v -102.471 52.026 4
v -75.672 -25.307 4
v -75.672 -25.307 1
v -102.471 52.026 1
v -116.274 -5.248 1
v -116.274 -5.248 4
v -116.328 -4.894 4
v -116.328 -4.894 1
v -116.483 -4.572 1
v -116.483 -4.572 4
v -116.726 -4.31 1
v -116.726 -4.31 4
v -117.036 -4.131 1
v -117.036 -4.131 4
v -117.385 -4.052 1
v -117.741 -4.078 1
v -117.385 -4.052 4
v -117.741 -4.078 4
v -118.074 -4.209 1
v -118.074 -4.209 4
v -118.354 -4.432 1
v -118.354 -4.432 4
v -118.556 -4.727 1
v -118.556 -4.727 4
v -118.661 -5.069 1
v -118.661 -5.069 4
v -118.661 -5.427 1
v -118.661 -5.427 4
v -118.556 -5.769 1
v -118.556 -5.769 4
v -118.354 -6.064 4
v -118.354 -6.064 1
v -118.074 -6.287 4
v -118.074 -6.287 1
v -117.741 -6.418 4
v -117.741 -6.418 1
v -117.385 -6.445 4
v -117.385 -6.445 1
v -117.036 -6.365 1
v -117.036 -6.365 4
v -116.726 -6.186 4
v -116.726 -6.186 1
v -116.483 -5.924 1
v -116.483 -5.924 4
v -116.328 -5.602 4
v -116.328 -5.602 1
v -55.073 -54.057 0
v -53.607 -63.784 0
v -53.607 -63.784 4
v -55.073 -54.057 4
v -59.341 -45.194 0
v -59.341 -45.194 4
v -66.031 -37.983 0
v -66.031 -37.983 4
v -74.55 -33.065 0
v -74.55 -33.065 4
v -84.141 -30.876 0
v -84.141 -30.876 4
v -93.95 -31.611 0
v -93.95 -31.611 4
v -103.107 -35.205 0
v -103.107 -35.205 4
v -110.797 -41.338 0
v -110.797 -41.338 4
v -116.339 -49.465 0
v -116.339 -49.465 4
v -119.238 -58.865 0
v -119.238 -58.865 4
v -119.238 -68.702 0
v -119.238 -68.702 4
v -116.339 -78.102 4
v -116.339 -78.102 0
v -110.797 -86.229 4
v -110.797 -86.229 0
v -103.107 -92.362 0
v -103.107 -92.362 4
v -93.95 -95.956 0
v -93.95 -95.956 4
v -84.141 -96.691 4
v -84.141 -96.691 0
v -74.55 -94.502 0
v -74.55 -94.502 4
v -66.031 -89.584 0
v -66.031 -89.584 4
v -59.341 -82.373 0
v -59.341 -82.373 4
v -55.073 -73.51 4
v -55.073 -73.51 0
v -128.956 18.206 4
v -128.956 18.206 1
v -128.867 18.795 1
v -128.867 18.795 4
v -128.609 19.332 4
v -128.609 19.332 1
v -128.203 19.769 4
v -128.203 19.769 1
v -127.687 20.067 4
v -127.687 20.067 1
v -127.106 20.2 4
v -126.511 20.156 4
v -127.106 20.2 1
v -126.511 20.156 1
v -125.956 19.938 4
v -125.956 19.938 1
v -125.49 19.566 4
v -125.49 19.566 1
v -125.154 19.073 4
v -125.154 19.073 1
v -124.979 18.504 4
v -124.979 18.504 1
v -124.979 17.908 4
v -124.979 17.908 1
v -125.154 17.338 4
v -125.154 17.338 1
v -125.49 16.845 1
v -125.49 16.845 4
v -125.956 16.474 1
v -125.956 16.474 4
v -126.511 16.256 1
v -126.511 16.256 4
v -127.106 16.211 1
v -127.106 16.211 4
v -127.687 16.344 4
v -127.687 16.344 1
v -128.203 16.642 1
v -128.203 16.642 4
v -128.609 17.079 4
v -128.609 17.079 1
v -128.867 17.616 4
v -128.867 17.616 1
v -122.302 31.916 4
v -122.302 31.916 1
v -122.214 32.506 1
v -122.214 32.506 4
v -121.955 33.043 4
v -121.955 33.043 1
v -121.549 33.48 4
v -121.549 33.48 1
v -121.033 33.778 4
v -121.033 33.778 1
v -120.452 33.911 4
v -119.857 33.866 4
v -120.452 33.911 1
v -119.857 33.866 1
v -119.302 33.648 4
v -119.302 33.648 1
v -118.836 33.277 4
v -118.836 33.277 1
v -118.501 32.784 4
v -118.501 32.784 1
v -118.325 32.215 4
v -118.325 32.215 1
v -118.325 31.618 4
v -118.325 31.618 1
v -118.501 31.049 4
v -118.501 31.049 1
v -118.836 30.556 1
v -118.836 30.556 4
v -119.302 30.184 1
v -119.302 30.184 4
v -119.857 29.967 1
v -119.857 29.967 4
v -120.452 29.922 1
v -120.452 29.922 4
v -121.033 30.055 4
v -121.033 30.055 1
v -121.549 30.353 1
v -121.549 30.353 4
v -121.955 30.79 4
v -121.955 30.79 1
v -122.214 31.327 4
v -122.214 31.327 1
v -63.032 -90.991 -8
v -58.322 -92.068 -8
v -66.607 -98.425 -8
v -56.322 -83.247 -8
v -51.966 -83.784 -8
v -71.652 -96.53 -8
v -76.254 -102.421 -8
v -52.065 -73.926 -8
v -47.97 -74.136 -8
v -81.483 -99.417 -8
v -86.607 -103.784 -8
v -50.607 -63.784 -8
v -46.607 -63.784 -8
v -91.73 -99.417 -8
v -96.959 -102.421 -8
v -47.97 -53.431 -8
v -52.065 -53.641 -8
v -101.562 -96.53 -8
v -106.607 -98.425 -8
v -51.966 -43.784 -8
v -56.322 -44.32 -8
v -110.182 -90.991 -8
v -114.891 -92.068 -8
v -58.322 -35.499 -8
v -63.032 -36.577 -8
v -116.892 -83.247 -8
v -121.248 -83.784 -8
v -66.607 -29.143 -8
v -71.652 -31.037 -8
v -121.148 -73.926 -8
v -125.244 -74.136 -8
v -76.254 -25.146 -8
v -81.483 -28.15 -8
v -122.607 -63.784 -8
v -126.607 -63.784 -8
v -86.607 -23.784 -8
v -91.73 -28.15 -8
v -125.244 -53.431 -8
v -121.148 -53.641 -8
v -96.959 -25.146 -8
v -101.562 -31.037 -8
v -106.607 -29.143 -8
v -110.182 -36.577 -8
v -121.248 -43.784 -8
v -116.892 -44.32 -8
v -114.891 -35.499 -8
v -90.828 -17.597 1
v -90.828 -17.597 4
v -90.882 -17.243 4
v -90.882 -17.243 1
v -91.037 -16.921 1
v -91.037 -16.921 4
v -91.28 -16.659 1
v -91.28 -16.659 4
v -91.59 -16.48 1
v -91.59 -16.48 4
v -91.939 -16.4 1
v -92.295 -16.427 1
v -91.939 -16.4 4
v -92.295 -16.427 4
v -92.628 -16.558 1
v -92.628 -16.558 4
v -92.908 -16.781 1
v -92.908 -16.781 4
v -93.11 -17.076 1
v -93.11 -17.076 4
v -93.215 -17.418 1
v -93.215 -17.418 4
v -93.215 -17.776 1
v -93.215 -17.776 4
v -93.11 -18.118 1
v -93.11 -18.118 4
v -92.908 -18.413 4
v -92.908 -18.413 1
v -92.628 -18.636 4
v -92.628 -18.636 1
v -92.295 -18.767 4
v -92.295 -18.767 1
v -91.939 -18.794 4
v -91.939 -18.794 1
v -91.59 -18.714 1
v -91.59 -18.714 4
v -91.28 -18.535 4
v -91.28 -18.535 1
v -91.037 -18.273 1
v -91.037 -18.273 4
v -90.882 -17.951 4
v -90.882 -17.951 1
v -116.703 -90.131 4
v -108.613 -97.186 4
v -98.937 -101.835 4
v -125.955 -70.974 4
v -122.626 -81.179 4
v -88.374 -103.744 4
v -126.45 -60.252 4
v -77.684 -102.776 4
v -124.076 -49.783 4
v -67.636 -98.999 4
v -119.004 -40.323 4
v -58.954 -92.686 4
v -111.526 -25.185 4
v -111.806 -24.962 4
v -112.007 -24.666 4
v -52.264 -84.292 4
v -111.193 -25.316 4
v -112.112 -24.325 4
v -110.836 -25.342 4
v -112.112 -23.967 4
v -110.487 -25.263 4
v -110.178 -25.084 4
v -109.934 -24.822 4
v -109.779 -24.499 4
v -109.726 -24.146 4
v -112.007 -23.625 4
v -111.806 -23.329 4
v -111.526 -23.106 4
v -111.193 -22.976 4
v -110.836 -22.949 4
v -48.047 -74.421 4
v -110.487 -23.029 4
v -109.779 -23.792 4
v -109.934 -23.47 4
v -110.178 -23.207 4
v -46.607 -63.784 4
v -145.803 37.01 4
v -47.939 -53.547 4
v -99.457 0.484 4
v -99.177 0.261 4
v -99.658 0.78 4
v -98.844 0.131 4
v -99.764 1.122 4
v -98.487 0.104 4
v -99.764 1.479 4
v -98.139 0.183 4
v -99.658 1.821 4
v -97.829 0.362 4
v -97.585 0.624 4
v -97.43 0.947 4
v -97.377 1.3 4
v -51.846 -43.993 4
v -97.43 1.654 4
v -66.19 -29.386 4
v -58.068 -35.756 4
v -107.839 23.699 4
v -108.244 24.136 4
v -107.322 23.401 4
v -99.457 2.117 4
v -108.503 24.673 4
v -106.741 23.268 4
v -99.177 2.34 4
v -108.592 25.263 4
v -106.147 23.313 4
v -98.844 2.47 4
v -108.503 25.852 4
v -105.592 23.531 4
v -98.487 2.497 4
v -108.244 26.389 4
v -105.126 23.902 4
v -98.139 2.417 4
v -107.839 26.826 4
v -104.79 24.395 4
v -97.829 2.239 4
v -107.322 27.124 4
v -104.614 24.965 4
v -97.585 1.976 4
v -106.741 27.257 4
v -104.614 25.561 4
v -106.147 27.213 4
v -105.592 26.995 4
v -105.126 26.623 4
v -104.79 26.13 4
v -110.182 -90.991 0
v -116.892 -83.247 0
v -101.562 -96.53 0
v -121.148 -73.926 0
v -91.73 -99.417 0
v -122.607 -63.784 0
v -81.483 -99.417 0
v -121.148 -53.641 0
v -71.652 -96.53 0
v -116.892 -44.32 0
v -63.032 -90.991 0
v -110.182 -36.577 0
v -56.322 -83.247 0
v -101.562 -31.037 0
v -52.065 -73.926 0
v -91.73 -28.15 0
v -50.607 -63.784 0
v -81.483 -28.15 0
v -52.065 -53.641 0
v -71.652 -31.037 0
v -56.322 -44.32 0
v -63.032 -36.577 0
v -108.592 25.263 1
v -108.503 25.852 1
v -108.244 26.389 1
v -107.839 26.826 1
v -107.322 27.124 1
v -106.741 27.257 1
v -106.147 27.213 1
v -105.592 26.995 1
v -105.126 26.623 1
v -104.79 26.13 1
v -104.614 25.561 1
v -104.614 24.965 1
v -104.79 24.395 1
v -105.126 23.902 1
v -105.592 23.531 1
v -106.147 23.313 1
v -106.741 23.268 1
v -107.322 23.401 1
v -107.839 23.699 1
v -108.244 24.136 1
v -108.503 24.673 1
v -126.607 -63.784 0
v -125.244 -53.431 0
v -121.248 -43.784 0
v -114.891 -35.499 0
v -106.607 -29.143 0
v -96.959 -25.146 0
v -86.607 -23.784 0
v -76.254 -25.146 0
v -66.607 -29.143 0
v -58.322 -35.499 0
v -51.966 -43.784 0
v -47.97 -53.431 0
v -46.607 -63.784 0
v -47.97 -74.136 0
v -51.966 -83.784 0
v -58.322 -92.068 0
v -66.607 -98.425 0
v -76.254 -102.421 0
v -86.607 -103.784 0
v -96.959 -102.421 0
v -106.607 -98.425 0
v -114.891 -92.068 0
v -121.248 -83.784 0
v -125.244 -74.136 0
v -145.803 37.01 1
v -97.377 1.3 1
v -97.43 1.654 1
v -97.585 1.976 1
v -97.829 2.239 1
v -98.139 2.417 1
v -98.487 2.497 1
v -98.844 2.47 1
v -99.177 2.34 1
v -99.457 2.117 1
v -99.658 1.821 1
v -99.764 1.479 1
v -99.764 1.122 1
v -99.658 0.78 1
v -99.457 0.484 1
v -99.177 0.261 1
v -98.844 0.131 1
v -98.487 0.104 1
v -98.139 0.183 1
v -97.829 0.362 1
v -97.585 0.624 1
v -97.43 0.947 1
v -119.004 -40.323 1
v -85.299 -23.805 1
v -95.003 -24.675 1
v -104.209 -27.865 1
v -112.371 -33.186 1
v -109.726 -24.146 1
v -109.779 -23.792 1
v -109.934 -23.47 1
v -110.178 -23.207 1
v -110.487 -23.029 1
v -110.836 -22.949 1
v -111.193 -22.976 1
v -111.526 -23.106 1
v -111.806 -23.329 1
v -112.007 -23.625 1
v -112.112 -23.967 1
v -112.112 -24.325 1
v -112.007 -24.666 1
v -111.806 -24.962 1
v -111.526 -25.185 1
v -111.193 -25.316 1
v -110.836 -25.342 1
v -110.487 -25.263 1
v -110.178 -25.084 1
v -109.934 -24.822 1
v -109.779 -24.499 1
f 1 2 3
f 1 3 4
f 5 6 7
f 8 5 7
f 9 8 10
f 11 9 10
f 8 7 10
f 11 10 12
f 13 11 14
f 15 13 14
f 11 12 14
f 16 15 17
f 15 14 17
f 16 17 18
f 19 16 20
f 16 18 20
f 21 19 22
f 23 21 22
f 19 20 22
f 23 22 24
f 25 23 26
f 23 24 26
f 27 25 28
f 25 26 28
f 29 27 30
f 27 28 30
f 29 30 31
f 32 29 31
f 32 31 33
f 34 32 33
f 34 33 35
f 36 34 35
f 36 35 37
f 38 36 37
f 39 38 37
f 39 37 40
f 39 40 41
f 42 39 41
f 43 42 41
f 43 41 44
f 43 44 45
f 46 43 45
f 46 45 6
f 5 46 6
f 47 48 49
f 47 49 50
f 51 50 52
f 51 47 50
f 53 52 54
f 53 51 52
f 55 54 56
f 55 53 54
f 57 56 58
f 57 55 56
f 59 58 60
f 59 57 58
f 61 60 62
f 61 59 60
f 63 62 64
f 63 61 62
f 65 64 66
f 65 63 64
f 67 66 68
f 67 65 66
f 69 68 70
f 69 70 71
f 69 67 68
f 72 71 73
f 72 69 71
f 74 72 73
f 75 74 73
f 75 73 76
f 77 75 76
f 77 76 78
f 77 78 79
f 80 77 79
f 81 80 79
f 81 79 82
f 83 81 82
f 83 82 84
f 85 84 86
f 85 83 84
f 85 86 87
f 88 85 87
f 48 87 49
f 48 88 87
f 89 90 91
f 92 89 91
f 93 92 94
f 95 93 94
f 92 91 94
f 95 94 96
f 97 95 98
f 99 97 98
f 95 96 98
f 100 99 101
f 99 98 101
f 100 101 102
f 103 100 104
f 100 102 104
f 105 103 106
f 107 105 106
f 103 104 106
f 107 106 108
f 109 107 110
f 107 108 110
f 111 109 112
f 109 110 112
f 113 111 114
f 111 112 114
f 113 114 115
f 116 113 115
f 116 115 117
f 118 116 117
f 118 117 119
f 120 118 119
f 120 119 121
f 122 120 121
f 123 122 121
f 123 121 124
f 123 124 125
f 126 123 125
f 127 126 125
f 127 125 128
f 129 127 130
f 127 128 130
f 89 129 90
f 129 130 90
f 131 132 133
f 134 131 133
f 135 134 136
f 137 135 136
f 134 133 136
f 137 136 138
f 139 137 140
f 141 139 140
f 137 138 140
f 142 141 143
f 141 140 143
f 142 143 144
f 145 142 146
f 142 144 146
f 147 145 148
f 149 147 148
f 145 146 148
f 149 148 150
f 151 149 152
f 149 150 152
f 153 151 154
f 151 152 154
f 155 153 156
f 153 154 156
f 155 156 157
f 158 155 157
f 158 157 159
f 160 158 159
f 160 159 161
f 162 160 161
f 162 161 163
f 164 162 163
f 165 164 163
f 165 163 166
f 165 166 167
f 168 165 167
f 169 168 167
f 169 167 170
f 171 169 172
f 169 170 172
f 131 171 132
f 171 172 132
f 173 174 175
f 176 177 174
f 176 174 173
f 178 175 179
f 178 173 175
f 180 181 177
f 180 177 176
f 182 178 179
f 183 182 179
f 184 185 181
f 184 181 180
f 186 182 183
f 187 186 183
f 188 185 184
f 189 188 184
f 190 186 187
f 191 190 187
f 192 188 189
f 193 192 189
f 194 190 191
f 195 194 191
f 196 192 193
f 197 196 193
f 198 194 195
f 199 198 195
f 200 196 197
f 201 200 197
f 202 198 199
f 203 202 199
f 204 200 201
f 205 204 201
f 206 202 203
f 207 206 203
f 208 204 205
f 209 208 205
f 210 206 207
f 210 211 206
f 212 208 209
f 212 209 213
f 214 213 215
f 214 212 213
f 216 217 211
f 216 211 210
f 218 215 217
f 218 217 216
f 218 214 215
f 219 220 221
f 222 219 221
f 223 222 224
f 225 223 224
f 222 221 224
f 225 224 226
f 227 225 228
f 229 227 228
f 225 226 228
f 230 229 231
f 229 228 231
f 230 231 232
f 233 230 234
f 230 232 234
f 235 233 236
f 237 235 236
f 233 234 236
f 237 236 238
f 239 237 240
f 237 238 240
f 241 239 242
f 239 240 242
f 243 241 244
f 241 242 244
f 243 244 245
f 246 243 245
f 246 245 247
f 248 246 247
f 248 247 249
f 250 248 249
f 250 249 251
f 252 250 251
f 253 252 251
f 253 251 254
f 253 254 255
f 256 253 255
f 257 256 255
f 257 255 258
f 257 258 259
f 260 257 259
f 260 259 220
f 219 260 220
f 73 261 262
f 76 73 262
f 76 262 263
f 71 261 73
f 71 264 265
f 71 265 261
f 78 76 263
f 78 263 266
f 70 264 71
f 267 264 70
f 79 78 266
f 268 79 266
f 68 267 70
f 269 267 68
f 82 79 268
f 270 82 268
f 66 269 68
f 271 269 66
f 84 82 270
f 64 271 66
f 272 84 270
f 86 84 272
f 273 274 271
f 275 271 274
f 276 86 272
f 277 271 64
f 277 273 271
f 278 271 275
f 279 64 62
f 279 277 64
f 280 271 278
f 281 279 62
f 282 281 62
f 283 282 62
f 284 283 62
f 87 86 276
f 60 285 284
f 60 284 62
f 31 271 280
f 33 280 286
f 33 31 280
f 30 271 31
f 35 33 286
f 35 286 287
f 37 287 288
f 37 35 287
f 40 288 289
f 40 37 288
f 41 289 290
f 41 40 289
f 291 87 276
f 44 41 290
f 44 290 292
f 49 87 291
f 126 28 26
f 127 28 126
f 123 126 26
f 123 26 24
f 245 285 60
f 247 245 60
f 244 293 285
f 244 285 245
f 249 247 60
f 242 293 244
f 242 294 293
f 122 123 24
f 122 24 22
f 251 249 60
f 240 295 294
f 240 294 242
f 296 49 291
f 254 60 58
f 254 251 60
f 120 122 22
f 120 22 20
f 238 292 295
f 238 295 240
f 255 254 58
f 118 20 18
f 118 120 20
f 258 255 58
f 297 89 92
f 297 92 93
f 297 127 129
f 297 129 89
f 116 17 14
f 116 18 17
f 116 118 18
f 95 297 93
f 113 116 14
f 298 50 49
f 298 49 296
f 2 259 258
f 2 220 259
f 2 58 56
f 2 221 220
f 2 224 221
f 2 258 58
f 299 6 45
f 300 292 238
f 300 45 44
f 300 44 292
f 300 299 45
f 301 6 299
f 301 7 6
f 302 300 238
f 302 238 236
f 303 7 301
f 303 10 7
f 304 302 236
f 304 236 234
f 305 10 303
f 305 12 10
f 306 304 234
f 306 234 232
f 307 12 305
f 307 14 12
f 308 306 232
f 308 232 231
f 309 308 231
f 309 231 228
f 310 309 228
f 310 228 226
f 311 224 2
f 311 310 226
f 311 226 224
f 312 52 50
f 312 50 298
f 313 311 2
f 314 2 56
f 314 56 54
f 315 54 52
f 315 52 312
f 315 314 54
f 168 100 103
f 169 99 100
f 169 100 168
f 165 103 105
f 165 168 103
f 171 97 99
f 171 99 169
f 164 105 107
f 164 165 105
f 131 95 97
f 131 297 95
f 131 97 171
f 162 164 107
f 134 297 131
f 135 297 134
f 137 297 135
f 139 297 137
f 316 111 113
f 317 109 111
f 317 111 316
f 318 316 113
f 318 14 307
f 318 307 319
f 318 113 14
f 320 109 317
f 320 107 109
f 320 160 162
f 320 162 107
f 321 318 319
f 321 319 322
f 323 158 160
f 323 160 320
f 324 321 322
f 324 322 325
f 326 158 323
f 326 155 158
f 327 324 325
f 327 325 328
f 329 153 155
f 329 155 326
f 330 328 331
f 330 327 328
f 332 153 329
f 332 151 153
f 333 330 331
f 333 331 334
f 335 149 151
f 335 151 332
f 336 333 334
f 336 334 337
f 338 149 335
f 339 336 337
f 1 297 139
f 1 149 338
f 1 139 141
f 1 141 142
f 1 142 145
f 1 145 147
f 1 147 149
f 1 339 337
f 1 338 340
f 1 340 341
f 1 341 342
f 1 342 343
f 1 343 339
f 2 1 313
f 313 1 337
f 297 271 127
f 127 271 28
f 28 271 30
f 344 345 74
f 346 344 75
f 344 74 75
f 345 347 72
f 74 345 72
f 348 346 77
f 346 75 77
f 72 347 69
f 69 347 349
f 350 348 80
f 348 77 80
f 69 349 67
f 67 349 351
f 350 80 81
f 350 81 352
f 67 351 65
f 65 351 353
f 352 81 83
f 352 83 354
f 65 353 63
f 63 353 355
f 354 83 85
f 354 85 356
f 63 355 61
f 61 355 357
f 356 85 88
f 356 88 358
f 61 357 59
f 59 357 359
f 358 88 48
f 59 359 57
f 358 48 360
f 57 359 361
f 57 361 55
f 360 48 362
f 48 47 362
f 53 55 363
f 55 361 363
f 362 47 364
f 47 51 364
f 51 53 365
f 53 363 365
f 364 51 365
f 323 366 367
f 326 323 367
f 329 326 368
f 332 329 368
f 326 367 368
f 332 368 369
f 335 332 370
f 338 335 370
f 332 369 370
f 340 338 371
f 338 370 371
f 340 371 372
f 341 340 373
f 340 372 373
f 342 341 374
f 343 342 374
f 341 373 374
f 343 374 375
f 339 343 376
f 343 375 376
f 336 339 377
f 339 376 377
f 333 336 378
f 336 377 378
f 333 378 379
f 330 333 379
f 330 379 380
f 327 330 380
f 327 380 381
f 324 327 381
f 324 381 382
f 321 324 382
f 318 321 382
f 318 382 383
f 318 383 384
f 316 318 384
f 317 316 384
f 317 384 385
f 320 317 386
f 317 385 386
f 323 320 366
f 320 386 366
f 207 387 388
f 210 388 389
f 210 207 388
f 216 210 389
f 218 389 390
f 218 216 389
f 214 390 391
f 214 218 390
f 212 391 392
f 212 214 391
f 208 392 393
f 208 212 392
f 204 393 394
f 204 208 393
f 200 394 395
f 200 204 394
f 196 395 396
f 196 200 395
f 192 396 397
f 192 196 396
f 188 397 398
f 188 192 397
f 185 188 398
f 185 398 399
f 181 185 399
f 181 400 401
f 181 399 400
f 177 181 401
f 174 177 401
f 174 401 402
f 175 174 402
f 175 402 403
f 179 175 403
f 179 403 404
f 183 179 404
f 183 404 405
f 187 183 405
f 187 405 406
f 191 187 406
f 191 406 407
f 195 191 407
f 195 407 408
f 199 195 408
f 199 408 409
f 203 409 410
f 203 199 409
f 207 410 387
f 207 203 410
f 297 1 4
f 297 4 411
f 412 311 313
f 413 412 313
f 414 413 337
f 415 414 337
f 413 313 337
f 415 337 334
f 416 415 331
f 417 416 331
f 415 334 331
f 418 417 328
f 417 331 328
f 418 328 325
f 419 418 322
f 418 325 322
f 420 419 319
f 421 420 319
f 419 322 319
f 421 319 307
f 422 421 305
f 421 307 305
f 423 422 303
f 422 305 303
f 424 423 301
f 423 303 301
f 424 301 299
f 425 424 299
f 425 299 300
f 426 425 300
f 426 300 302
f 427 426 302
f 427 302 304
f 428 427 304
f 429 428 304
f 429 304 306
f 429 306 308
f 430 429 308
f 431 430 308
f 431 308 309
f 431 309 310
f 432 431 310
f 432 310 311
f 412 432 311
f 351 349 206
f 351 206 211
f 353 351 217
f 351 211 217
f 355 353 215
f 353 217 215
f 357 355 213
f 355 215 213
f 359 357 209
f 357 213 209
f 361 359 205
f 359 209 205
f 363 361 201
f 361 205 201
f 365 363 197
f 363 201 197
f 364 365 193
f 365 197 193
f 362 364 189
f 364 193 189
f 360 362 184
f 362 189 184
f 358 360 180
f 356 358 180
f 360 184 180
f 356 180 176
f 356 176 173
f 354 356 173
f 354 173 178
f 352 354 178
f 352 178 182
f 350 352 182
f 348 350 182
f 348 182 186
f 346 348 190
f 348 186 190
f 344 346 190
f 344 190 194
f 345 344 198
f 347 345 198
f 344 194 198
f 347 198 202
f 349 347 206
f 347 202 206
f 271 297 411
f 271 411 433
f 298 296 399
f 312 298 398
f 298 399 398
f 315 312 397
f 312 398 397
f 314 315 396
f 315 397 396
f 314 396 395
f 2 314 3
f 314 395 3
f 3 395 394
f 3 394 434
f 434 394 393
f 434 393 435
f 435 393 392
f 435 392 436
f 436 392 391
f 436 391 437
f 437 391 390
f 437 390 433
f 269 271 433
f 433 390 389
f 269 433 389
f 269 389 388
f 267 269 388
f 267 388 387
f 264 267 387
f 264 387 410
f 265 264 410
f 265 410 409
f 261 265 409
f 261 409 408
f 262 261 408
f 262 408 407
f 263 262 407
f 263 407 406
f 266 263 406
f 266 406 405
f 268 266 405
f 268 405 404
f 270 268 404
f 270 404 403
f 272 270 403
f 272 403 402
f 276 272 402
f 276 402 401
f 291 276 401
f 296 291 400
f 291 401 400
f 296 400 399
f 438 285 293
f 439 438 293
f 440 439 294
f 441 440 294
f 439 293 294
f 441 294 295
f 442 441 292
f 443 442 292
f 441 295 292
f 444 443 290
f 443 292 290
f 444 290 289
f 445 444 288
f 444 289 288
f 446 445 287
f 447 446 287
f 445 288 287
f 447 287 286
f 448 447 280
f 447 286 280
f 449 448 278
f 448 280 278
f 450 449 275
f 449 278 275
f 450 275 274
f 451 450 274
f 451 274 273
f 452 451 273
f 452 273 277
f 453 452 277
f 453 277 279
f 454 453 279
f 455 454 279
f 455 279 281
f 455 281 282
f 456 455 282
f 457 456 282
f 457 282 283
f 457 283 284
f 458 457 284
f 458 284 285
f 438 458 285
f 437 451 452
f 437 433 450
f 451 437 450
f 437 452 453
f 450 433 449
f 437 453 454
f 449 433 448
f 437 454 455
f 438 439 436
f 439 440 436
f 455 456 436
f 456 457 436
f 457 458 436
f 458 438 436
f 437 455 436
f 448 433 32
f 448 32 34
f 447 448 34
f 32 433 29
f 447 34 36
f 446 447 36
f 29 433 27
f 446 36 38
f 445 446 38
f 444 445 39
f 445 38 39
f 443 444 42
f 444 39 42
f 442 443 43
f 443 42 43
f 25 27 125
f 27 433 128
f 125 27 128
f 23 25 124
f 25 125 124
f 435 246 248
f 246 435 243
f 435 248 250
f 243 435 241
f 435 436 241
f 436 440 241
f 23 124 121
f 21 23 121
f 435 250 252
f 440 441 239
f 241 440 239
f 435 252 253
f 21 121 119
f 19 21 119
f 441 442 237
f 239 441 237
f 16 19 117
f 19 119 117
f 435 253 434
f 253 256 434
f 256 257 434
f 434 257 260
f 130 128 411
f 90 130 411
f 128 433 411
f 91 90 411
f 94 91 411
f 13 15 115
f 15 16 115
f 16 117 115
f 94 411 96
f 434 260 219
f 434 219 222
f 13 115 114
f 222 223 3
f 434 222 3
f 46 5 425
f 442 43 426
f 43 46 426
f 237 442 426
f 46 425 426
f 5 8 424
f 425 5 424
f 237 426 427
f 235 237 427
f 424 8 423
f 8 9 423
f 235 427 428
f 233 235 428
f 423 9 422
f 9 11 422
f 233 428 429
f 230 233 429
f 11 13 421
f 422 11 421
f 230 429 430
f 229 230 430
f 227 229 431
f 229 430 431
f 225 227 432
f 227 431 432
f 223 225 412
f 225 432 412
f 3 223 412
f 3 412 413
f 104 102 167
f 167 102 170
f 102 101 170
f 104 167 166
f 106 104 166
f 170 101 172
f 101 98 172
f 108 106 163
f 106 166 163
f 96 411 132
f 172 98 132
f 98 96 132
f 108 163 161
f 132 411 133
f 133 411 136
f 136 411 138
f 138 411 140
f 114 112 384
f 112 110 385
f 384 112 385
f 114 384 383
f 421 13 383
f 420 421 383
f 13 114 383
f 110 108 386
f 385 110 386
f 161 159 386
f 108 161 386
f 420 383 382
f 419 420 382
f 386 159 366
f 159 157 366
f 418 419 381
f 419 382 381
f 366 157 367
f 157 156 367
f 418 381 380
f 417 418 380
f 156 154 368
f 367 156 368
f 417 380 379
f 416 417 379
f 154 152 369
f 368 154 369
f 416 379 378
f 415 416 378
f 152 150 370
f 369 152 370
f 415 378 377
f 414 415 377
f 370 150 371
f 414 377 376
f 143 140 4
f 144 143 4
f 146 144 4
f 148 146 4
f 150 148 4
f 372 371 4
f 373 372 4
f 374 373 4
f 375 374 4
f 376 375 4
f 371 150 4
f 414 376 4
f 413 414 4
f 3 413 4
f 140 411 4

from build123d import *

# Parameters (mm, degrees)
SKETCH_1_R          = 40
SKETCH_1_R_2        = 33
EXTRUDE_1_DEPTH     = 4
EXTRUDE_START       = 8
SKETCH_2_R          = 40
SKETCH_2_R_2        = 36
EXTRUDE_2_DEPTH     = 8
EXTRUDE_3_DEPTH     = 3
SKETCH_6_R          = 2
CUT_EXTRUDE_1_DEPTH = 3
SKETCH_7_R          = 1.2
CUT_EXTRUDE_2_DEPTH = 5


with BuildPart() as part:
    # 草图1 → 凸台-拉伸1 (new body)
    with BuildSketch(Plane.XY):
        with Locations((-86.606649797, -63.783530386)):
            Circle(SKETCH_1_R)
        with Locations((-86.606649797, -63.783530386)):
            Circle(SKETCH_1_R_2, mode=Mode.SUBTRACT)
    extrude(amount=EXTRUDE_1_DEPTH)

    # 草图2 → 凸台-拉伸2 (add)
    with BuildSketch(Plane(origin=(0, 0, 0), x_dir=(-1, 0, 0), z_dir=(0, 0, -1)).offset(EXTRUDE_START)):
        with Locations((86.606649797, -63.783530386)):
            Circle(SKETCH_2_R)
        with Locations((86.606649797, -63.783530386)):
            Circle(SKETCH_2_R_2, mode=Mode.SUBTRACT)
    extrude(amount=-EXTRUDE_2_DEPTH)

    # 草图4 → 凸台-拉伸3 (add)
    with BuildSketch(Plane.XY.offset(4)):
        with BuildLine():
            Line((-102.470674133, 52.025849932), (-145.802574452, 37.009933401))
            Line((-145.802574452, 37.009933401), (-118.238289751, -42.533185695))
            ThreePointArc((-118.238289751, -42.533185695), (-99.084005703, -27.777233919), (-74.906389432, -27.517269163))
            Line((-74.906389432, -27.517269163), (-102.470674133, 52.025849932))
        make_face()
    extrude(amount=-EXTRUDE_3_DEPTH)

    # 草图6 → 切除-拉伸1 (cut)
    with BuildSketch(Plane(origin=(0, 0, 1), x_dir=(-1, 0, 0), z_dir=(0, 0, -1))):
        with Locations((120.302459735, 31.916433112)):
            Circle(SKETCH_6_R)
        with Locations((126.956233046, 18.205691171)):
            Circle(SKETCH_6_R)
        with Locations((106.591717794, 25.262659801)):
            Circle(SKETCH_6_R)
    extrude(amount=-CUT_EXTRUDE_1_DEPTH, mode=Mode.SUBTRACT)

    # 草图7 → 切除-拉伸2 (cut)
    with BuildSketch(Plane.XY.offset(4)):
        with Locations((-117.474470724, -5.248159683)):
            Circle(SKETCH_7_R)
        with Locations((-110.925868003, -24.145667519)):
            Circle(SKETCH_7_R)
        with Locations((-98.576962888, 1.300443037)):
            Circle(SKETCH_7_R)
        with Locations((-92.028360167, -17.597064799)):
            Circle(SKETCH_7_R)
    extrude(amount=-CUT_EXTRUDE_2_DEPTH, mode=Mode.SUBTRACT)


solid = part.part
